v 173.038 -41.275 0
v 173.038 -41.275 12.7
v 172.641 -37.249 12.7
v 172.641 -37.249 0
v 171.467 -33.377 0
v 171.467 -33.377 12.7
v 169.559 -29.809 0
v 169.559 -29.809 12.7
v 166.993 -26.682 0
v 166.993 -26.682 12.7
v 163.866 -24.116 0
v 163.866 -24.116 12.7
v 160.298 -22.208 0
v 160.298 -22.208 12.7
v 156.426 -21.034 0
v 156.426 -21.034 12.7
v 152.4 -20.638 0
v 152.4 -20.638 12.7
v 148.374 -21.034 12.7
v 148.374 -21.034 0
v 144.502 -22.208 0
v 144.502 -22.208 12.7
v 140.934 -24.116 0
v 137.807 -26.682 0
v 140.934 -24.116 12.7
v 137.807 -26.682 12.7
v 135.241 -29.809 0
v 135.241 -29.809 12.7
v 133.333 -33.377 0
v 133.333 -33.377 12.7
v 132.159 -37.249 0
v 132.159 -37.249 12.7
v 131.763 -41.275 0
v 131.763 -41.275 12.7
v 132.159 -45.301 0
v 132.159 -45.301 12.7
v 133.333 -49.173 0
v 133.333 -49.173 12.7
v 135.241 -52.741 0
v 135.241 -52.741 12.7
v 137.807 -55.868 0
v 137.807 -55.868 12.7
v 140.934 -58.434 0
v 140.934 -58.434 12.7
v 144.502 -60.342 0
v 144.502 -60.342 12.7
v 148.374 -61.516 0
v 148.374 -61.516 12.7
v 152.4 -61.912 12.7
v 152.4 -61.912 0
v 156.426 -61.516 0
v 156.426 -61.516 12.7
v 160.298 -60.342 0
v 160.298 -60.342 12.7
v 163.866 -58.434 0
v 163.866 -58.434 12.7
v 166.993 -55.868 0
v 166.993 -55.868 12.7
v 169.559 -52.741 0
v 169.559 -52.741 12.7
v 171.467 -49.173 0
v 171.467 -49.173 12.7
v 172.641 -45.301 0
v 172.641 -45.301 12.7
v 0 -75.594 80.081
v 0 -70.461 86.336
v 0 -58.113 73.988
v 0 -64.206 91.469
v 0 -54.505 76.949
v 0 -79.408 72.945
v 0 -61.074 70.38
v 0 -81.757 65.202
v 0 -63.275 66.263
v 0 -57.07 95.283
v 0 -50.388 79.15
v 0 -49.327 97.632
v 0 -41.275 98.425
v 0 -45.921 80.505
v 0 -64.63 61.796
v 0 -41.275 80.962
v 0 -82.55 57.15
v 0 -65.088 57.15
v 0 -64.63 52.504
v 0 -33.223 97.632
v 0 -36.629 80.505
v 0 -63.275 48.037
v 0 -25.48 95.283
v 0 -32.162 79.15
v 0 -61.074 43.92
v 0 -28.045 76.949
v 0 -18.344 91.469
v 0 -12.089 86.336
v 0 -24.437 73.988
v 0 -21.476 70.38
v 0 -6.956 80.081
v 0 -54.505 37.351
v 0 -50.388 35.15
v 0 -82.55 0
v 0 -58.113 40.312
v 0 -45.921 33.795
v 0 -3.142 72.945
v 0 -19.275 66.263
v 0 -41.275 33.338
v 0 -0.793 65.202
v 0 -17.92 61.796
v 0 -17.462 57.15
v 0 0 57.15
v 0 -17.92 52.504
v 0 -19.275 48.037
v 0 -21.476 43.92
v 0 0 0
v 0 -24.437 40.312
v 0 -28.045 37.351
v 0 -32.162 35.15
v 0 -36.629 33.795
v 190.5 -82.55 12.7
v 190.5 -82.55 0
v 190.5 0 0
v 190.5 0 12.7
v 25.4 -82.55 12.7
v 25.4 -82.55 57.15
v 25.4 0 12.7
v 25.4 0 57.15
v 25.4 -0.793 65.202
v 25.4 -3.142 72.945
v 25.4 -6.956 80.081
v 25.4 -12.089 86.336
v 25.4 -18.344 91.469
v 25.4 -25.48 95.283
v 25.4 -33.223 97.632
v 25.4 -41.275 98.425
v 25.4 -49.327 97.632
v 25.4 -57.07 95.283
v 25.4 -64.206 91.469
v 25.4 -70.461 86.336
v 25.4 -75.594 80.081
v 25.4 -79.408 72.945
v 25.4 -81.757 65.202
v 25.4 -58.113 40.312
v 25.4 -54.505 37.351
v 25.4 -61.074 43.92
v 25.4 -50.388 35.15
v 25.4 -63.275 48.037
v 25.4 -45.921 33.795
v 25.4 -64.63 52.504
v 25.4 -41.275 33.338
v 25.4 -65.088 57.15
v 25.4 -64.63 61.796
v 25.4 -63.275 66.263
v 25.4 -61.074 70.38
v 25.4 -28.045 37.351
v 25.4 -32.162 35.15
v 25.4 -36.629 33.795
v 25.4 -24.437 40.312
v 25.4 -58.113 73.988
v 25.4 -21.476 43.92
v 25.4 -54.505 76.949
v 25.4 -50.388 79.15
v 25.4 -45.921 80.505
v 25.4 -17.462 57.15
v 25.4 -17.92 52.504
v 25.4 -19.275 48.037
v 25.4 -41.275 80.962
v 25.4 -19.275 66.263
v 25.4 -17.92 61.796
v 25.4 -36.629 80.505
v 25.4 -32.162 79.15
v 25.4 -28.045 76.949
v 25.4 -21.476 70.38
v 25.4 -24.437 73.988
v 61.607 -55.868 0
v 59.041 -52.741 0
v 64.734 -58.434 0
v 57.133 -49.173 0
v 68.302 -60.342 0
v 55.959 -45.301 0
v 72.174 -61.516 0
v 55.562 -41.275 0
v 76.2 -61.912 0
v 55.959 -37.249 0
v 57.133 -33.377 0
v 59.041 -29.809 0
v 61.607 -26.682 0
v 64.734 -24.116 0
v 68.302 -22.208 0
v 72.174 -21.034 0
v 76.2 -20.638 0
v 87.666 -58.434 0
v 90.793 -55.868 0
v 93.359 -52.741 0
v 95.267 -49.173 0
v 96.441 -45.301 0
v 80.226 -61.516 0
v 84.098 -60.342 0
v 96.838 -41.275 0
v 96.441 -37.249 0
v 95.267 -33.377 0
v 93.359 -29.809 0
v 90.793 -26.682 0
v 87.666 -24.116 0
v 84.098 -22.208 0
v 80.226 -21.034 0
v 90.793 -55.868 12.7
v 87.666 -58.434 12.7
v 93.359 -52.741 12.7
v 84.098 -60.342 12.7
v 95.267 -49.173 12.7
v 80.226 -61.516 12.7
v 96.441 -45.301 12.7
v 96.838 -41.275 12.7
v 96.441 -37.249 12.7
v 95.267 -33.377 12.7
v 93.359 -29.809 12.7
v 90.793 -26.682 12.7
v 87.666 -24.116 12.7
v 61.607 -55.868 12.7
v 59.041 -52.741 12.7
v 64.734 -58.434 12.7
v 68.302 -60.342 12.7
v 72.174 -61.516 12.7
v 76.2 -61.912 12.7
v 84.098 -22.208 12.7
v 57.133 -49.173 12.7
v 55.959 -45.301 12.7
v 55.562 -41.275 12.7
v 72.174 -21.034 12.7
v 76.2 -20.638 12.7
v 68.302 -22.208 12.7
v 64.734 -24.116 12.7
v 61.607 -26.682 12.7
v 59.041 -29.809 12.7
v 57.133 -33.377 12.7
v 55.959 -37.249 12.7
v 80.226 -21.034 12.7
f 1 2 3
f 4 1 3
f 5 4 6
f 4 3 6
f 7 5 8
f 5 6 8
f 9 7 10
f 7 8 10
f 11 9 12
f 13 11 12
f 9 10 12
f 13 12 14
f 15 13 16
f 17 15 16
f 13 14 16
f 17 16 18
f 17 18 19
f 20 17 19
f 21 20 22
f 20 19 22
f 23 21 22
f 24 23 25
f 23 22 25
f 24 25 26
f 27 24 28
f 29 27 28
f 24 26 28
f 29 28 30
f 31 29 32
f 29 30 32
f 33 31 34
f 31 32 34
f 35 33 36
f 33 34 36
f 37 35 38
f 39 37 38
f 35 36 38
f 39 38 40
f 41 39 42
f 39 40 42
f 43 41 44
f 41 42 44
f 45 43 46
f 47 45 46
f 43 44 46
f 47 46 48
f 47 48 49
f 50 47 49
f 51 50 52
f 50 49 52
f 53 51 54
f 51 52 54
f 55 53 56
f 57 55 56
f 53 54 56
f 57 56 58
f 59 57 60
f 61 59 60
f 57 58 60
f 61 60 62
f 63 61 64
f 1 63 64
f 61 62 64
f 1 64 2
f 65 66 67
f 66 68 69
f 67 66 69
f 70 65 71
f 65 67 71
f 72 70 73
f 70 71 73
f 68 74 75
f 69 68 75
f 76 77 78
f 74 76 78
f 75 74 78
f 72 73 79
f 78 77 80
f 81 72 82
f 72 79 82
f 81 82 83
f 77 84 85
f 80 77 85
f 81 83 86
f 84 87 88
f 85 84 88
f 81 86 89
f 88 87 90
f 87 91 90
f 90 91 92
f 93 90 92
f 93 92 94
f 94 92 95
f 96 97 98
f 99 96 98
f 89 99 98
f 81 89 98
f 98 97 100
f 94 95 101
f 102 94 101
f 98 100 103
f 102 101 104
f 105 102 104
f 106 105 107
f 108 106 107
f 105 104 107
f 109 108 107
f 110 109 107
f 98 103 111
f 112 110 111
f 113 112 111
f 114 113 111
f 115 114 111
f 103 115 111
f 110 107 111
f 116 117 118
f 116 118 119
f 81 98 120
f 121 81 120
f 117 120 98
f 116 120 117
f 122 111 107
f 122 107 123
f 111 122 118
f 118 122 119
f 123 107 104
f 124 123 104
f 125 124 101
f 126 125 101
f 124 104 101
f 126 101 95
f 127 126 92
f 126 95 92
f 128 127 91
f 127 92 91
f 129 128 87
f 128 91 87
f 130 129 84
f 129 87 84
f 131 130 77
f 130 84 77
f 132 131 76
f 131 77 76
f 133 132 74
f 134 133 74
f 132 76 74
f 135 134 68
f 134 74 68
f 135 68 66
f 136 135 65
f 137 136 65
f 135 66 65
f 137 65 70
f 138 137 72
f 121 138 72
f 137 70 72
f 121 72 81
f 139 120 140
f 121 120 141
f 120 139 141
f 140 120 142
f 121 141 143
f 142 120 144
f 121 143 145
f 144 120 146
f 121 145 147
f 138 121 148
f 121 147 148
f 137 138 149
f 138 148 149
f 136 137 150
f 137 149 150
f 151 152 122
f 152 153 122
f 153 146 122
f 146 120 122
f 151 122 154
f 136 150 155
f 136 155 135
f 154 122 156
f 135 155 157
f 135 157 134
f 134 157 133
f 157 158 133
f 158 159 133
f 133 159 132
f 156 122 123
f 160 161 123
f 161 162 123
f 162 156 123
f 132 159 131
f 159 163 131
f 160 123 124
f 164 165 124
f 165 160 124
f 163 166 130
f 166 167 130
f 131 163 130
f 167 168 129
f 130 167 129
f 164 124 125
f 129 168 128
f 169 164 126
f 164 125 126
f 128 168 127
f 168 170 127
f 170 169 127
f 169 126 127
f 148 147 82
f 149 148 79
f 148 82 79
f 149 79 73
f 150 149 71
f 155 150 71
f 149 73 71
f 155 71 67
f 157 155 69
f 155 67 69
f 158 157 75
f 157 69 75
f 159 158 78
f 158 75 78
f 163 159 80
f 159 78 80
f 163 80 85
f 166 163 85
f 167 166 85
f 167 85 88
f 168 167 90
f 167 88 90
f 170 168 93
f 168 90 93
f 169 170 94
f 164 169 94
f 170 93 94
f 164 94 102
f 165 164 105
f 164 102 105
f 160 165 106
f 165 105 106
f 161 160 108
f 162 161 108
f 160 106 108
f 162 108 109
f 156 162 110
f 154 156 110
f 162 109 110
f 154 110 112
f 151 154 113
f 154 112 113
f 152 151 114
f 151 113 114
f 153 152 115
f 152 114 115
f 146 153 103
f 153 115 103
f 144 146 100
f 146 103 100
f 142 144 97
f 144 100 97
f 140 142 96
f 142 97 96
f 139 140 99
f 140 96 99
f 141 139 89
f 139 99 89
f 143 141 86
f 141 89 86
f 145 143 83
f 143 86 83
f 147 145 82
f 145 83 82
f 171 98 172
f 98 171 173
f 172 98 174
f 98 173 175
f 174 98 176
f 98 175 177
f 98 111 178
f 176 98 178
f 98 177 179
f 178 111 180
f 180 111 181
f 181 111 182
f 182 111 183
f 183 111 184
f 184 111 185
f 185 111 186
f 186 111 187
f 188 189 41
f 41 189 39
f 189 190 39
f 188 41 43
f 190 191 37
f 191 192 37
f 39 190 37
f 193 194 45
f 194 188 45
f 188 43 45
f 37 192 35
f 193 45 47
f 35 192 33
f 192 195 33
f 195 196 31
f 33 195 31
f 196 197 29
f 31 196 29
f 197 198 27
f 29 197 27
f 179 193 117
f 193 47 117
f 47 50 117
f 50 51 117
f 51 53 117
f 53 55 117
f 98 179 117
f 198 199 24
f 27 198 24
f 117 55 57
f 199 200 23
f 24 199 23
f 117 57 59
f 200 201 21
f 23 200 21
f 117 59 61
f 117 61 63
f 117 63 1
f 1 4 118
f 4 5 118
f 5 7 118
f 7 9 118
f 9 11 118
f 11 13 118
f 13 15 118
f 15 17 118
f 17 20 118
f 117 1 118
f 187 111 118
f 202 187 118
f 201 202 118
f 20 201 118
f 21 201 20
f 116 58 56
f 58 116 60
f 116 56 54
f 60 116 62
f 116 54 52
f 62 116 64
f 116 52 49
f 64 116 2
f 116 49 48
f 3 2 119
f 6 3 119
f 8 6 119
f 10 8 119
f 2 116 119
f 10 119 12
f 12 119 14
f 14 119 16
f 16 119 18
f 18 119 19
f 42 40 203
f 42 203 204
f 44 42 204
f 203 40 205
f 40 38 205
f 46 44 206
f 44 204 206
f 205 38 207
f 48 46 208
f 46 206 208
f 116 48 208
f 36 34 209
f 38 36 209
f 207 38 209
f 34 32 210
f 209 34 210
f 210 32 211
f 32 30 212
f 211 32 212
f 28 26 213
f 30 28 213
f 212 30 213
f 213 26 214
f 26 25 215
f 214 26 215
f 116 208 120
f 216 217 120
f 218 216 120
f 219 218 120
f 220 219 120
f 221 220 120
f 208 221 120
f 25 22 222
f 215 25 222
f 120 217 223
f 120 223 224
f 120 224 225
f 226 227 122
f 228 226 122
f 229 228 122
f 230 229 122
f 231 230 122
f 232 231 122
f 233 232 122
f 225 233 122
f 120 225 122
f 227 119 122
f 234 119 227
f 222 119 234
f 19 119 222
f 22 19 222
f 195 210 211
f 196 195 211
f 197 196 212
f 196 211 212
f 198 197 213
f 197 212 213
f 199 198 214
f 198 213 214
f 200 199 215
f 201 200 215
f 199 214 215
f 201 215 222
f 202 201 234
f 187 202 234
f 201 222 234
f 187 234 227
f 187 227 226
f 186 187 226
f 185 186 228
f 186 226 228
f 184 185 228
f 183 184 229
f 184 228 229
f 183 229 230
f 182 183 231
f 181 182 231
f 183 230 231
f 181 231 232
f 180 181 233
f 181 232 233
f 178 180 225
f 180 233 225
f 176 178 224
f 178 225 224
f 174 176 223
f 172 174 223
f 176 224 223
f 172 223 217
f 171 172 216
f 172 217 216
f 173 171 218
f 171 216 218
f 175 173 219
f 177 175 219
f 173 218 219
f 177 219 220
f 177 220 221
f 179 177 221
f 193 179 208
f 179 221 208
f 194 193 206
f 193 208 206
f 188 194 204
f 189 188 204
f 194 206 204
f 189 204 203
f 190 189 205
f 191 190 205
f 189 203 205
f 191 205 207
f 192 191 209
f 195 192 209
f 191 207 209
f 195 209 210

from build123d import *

# Parameters (mm, degrees)
F1_DEPTH = 82.55
F2_R     = 20.6375
F3_DEPTH = 12.7
F5_DEPTH = 25.4
F6_R     = 23.8125
F7_DEPTH = 25.4


with BuildPart() as f1:
    # F0 (on Front) → F1 (new body)
    with BuildSketch(Plane.XZ):
        Polygon((0, 139.7), (0, 0), (190.5, 0), (190.5, 12.7), (25.4, 12.7), (25.4, 139.7), align=None)
    extrude(amount=F1_DEPTH)

    # F2 (on face) → F3 (cut, through all)
    with BuildSketch(Plane.XY.offset(12.7)):
        with Locations((76.2, -41.275)):
            Circle(F2_R)
        with Locations((152.4, -41.275)):
            Circle(F2_R)
    extrude(amount=-F3_DEPTH, mode=Mode.SUBTRACT)

    # F4 (on face) → F5 (cut)
    with BuildSketch(Plane(origin=(0, 0, 0), x_dir=(0, -1, 0), z_dir=(-1, 0, 0))):
        with BuildLine():
            ThreePointArc((0, 57.15), (41.275, 98.425), (82.55, 57.15))
            Line((82.55, 57.15), (82.55, 139.7))
            Line((82.55, 139.7), (0, 139.7))
            Line((0, 139.7), (0, 57.15))
        make_face()
    extrude(amount=-F5_DEPTH, mode=Mode.SUBTRACT)

    # F6 (on face) → F7 (cut, through all)
    with BuildSketch(Plane(origin=(0, 0, 0), x_dir=(0, -1, 0), z_dir=(-1, 0, 0))):
        with Locations((41.275, 57.15)):
            Circle(F6_R)
    extrude(amount=-F7_DEPTH, mode=Mode.SUBTRACT)


solid = f1.part
